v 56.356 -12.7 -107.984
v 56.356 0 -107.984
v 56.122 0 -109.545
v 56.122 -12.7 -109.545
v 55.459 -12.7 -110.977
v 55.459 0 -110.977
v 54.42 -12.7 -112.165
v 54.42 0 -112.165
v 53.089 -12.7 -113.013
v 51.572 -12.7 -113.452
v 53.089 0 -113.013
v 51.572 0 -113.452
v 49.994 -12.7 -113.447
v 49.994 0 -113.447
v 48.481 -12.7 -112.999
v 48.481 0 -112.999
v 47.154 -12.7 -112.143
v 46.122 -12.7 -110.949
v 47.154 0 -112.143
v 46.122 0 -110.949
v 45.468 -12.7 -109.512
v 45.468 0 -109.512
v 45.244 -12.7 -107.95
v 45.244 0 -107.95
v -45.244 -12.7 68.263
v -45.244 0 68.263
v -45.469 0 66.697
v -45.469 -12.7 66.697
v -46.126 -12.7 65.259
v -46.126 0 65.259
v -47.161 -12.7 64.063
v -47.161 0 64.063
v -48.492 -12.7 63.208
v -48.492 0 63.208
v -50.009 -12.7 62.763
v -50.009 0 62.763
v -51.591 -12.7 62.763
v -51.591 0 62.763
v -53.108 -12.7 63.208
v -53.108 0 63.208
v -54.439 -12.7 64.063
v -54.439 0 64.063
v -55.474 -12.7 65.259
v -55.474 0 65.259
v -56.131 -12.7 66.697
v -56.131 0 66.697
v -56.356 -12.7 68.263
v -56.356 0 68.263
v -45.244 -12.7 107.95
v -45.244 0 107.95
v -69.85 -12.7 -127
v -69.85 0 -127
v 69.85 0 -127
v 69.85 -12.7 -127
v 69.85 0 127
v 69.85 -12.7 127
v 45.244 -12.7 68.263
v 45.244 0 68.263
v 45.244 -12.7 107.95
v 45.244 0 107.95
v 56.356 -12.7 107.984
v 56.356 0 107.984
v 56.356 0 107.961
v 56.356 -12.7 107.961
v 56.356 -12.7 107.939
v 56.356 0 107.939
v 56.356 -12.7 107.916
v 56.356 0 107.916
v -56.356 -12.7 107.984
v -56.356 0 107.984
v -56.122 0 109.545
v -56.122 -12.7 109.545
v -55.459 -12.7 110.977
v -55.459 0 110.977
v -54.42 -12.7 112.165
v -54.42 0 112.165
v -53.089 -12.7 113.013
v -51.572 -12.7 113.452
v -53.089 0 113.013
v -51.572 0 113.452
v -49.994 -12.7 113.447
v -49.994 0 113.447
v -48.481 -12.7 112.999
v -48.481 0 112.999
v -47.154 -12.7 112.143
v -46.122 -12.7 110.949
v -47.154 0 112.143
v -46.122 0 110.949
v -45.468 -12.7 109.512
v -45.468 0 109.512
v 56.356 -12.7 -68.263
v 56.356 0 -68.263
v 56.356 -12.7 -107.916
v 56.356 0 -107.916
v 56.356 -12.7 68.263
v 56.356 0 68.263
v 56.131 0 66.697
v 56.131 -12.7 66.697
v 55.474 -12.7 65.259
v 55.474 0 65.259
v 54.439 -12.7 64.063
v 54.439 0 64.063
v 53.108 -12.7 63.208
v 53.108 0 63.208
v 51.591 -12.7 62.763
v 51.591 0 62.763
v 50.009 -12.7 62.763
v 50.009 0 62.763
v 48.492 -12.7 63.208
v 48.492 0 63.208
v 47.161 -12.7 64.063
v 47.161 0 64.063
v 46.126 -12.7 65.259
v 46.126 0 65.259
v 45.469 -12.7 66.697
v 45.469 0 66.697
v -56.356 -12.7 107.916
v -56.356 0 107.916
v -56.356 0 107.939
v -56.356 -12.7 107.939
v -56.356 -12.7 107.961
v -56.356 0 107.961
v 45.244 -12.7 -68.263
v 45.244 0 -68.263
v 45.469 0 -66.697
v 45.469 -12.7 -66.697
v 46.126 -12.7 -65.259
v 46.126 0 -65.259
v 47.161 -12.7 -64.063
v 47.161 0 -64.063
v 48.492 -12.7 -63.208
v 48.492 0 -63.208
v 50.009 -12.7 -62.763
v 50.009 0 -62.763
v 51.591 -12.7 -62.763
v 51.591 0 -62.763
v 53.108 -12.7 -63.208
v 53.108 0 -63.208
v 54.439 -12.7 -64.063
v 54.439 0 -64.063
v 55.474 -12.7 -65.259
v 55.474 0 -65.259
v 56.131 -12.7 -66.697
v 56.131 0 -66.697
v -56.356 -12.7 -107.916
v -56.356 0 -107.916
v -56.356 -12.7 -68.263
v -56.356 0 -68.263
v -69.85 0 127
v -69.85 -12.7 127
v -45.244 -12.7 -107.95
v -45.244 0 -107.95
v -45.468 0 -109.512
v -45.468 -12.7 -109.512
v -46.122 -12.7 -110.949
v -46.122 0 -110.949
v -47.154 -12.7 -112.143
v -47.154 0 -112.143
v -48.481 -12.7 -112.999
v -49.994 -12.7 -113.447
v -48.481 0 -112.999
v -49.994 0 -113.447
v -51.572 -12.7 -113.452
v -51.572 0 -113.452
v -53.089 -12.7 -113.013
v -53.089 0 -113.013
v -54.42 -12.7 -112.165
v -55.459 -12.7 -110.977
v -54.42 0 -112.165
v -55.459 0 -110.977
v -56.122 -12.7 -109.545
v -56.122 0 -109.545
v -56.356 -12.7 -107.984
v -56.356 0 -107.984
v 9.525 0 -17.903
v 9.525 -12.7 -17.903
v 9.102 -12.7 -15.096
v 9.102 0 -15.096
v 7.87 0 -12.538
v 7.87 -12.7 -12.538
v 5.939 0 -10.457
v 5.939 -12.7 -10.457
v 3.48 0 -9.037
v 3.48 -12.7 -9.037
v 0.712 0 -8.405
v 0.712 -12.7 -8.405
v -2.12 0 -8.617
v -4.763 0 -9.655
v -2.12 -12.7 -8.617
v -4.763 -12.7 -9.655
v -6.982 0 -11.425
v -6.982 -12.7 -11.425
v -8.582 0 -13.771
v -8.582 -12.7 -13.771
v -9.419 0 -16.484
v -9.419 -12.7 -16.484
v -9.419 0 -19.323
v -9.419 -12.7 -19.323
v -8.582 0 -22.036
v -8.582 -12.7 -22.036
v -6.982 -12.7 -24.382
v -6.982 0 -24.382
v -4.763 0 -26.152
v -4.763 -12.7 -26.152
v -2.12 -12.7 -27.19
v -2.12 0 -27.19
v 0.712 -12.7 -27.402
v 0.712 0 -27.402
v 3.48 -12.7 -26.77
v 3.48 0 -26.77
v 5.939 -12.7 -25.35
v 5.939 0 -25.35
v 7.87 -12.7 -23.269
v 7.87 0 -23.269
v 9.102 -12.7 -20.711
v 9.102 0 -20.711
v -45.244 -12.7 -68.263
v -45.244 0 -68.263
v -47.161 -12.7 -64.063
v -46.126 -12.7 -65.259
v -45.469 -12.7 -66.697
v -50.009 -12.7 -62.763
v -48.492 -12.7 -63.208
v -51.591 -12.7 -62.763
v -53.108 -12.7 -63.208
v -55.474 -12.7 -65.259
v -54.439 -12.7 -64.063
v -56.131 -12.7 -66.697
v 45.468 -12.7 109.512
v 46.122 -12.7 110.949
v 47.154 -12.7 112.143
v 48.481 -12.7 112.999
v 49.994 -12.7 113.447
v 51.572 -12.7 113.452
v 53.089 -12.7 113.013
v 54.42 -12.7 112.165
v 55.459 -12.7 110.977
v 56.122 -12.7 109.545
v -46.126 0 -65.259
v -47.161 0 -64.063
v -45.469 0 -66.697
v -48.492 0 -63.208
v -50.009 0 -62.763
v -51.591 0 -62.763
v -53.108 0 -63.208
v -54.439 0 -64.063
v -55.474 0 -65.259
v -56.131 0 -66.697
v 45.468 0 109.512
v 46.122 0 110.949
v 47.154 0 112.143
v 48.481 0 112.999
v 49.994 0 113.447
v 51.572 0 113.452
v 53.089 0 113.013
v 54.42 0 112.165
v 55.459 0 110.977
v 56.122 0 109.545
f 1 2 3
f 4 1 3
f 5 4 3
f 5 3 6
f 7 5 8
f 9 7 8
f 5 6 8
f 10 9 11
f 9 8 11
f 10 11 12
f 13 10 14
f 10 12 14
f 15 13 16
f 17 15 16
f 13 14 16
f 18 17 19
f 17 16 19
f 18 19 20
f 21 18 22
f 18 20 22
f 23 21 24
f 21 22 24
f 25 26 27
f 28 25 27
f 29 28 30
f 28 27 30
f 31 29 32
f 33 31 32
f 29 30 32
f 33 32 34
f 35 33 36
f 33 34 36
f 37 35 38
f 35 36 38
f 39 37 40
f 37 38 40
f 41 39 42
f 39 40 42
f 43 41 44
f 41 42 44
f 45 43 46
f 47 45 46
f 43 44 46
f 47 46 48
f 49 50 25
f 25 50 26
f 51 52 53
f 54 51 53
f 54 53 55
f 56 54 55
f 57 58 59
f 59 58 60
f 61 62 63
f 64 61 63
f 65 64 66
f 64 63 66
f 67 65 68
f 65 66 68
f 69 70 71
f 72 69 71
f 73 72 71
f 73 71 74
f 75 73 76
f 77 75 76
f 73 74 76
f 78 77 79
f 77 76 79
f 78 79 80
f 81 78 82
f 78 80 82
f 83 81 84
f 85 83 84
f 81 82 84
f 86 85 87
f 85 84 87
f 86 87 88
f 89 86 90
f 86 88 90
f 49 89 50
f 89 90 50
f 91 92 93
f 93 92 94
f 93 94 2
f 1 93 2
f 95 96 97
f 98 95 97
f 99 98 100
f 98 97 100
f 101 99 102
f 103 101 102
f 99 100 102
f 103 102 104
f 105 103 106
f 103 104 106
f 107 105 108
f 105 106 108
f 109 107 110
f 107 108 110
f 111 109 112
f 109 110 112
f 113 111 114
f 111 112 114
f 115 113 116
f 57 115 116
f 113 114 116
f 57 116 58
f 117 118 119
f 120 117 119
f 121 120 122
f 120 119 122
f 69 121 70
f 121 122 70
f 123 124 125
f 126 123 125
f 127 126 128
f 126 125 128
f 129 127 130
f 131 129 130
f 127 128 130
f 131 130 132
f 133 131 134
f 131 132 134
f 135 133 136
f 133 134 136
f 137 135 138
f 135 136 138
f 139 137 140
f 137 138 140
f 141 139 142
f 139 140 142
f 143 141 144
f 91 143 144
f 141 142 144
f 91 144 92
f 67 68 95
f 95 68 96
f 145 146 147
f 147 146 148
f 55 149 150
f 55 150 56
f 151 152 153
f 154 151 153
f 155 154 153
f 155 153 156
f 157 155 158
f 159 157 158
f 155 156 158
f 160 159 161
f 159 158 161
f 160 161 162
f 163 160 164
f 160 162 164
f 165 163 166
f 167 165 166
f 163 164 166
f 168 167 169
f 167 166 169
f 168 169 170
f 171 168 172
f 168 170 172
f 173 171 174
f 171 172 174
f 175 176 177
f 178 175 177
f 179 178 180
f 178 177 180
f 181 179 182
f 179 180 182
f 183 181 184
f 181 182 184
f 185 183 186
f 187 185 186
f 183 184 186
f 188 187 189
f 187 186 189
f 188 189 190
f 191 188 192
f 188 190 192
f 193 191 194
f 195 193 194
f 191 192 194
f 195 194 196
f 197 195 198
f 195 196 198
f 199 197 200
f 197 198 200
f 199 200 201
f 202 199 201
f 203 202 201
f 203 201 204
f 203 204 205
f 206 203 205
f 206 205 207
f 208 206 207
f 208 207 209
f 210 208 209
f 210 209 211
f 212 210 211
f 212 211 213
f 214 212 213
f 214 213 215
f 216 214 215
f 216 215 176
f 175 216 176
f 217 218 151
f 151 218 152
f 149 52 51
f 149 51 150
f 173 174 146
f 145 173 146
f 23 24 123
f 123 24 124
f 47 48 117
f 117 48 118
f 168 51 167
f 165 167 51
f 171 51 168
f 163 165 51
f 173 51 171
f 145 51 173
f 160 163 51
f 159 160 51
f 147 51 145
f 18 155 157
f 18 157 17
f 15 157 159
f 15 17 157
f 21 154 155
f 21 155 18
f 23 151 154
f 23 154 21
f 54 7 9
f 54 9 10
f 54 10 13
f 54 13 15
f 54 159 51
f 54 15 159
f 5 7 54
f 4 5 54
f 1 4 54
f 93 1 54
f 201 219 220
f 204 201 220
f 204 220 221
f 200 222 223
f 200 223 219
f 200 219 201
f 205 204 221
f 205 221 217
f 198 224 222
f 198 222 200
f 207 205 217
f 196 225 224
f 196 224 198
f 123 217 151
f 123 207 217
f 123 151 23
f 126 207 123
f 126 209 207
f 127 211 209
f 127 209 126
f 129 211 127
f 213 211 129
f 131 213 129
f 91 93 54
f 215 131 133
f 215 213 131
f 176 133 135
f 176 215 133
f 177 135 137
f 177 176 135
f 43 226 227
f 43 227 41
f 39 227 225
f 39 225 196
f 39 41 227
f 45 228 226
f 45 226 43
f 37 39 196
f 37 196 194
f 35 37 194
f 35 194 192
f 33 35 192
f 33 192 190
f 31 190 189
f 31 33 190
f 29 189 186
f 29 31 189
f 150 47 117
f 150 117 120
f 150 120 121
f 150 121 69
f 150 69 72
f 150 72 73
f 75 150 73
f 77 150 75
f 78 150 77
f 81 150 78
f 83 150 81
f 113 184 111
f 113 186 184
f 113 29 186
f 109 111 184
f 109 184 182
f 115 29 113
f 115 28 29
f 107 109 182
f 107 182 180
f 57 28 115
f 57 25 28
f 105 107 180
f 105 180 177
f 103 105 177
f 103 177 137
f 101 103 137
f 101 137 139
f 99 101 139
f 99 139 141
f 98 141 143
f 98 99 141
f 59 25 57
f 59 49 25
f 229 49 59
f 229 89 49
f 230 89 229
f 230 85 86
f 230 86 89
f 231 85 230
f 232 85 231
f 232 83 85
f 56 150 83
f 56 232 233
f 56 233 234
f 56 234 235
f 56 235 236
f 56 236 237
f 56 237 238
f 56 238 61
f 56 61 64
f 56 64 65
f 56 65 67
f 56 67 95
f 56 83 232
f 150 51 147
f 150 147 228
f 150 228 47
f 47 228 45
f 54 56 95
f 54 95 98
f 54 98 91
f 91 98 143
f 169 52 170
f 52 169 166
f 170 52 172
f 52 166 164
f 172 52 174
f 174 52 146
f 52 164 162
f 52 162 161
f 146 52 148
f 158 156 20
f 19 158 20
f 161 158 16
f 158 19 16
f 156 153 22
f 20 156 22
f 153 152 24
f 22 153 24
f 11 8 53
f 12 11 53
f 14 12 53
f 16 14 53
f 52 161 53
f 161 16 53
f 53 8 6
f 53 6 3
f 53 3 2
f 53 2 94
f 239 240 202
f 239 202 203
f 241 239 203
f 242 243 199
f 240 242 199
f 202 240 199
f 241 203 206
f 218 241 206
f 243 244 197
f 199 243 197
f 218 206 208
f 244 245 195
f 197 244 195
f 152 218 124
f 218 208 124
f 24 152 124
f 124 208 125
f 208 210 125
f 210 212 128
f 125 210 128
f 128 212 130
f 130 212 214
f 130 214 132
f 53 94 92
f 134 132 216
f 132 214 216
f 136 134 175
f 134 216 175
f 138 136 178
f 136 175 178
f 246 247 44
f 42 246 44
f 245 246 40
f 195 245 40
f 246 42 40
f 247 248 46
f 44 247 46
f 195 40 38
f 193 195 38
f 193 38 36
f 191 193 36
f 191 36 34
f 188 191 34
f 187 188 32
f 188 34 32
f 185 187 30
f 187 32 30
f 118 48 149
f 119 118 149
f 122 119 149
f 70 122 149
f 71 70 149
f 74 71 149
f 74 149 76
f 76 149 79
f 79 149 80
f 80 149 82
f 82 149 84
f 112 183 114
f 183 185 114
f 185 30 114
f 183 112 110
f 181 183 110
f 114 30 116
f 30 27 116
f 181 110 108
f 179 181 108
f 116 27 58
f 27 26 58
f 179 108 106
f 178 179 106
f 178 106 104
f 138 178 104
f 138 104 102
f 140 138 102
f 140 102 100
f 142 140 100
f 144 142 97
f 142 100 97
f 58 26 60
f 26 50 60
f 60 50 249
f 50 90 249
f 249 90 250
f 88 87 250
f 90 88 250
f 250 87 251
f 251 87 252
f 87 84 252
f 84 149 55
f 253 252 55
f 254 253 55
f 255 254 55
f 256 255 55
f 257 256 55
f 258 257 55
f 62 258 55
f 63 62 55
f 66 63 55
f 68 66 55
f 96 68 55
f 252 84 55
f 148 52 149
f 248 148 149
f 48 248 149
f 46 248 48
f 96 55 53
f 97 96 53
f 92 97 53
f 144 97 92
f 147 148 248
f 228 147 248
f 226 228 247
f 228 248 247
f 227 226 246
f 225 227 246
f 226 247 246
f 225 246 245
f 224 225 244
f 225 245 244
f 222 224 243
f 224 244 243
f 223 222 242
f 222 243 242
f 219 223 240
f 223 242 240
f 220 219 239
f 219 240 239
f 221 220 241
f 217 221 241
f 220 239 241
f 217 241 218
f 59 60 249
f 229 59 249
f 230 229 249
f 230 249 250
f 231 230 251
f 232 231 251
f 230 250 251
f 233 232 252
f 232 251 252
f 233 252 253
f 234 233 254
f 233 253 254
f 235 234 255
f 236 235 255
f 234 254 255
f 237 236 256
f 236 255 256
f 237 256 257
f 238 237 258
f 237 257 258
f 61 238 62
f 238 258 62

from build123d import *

# Parameters (mm, degrees)
F0_W     = 139.7
F0_H     = 254
F1_DEPTH = 12.7
F2_R     = 9.525
F3_DEPTH = 25.4


with BuildPart() as f1:
    # F0 (on Front) → F1 (new body)
    with BuildSketch(Plane.XZ):
        Rectangle(F0_W, F0_H)
        with BuildLine():
            Line((-56.356148, -107.916253), (-56.35625, -68.262514))
            ThreePointArc((-56.35625, -68.262514), (-50.8, -62.70625), (-45.24375, -68.262514))
            Line((-45.24375, -68.262514), (-45.24375, -107.95))
            ThreePointArc((-45.24375, -107.95), (-50.783112, -113.506224), (-56.356147, -107.983775))
            Line((-56.356147, -107.983775), (-56.356148, -107.916253))
        make_face(mode=Mode.SUBTRACT)
        with BuildLine():
            ThreePointArc((45.24375, -68.262514), (50.8, -62.70625), (56.35625, -68.262514))
            Line((56.35625, -68.262514), (56.356148, -107.916253))
            Line((56.356148, -107.916253), (56.356147, -107.983775))
            ThreePointArc((56.356147, -107.983775), (50.783112, -113.506224), (45.24375, -107.95))
            Line((45.24375, -107.95), (45.24375, -68.262514))
        make_face(mode=Mode.SUBTRACT)
        with BuildLine():
            ThreePointArc((-56.356147, 107.983775), (-50.783112, 113.506224), (-45.24375, 107.95))
            Line((-45.24375, 107.95), (-45.24375, 68.262514))
            ThreePointArc((-45.24375, 68.262514), (-50.8, 62.70625), (-56.35625, 68.262514))
            Line((-56.35625, 68.262514), (-56.356148, 107.916253))
            ThreePointArc((-56.356148, 107.916253), (-56.35625, 107.950014), (-56.356147, 107.983775))
        make_face(mode=Mode.SUBTRACT)
        with BuildLine():
            Line((45.24375, 68.262514), (45.24375, 107.95))
            ThreePointArc((45.24375, 107.95), (50.783112, 113.506224), (56.356147, 107.983775))
            ThreePointArc((56.356147, 107.983775), (56.35625, 107.950014), (56.356148, 107.916253))
            Line((56.356148, 107.916253), (56.35625, 68.262514))
            ThreePointArc((56.35625, 68.262514), (50.8, 62.70625), (45.24375, 68.262514))
        make_face(mode=Mode.SUBTRACT)
    extrude(amount=F1_DEPTH)

    # F2 (on face) → F3 (cut)
    with BuildSketch(Plane.XZ.offset(12.7)):
        with Locations((0, -17.903471)):
            Circle(F2_R)
    extrude(amount=-F3_DEPTH, mode=Mode.SUBTRACT)


solid = f1.part
